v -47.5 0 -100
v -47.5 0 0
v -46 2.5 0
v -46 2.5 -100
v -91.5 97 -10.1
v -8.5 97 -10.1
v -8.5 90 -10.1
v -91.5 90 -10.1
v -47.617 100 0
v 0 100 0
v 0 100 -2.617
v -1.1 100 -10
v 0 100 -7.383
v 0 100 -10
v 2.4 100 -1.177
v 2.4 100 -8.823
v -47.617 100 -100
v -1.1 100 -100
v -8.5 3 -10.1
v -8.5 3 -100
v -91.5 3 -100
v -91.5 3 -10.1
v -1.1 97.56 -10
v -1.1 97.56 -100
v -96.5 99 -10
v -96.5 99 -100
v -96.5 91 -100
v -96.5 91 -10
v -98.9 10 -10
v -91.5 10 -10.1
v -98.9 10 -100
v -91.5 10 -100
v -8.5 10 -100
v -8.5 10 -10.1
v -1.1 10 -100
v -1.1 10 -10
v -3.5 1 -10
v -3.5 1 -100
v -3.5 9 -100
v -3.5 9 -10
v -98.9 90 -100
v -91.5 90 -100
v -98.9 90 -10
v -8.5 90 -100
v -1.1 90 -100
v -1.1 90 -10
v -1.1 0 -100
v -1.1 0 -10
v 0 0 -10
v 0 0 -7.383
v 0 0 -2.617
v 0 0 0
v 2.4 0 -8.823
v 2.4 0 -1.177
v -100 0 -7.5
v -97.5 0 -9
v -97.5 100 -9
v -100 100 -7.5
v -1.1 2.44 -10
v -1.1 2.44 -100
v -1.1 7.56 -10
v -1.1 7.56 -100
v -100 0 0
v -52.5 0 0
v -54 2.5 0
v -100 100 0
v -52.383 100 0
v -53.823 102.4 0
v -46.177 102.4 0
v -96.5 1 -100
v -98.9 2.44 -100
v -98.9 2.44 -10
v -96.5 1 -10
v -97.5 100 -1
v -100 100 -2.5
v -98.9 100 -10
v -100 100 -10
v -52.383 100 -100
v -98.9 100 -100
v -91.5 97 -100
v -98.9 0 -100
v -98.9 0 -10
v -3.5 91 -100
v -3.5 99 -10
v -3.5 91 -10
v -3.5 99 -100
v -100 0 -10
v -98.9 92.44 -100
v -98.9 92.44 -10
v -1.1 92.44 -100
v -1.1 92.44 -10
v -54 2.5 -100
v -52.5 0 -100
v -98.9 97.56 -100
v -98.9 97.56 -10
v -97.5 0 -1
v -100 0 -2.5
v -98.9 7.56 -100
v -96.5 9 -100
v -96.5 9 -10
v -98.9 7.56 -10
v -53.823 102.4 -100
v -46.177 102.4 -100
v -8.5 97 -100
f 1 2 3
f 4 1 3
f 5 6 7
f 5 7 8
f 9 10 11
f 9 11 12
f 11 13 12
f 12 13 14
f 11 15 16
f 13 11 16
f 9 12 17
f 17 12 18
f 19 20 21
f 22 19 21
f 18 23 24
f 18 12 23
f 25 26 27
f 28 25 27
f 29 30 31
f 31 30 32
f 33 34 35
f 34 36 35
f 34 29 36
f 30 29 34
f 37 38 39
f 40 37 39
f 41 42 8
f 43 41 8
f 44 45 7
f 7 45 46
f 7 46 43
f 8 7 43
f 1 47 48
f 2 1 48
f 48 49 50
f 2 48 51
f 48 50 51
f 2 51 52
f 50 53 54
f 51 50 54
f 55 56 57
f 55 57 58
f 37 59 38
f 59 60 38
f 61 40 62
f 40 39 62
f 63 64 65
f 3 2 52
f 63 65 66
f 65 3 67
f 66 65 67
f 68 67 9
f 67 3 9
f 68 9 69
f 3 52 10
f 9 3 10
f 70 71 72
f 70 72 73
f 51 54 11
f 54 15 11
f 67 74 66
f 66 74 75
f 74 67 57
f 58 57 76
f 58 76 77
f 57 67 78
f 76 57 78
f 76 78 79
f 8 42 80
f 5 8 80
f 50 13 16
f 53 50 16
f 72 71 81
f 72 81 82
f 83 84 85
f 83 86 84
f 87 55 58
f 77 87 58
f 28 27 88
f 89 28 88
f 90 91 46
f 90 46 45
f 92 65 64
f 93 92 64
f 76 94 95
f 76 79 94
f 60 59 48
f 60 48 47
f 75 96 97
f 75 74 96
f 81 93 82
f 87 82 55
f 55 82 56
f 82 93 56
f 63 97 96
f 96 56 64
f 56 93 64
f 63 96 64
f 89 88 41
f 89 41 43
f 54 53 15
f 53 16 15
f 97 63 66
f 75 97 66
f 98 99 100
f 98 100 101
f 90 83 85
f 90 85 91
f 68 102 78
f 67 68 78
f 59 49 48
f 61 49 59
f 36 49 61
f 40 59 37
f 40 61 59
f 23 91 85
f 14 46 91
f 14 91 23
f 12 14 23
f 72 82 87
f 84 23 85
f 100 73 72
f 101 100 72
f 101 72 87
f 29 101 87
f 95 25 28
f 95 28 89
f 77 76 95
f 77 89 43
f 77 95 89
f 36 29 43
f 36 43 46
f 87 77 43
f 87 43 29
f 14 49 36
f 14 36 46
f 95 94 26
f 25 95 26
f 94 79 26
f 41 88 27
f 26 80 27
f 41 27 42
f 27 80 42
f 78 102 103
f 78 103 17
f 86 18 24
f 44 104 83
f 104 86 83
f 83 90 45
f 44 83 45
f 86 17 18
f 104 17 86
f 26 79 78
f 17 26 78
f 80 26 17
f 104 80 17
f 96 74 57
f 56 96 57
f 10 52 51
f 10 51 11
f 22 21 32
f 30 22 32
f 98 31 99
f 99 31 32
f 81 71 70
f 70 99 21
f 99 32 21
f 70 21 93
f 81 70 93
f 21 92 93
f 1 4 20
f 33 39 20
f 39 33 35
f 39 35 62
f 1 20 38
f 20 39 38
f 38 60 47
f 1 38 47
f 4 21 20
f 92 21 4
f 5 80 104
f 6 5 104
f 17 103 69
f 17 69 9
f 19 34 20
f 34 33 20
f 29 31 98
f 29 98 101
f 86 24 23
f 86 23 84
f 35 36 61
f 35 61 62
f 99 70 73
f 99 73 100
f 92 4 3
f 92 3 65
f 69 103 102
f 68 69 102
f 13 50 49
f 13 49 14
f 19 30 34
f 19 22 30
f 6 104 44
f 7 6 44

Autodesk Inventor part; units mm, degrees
ref_plane "YZ Plane" through (0, 0, 0) normal (1, 0, 0) x (0, 1, 0)
ref_plane "XZ Plane" through (0, 0, 0) normal (0, 1, 0) x (-1, 0, 0)
sketch "Sketch1" plane through (0, 0, 0) normal (1, 0, 0) x (0, 1, 0)
  line L0 (0, 0) -> (100, 0)
  line L1 (100, 0) -> (100, -100)
  line L2 (100, -100) -> (90, -100)
  line L3 (90, -100) -> (90, -10)
  line L4 (90, -10) -> (10, -10)
  line L5 (10, -10) -> (10, -100)
  line L6 (10, -100) -> (0, -100)
  line L7 (0, -100) -> (0, 0)
  dimension "d0" = 100
  dimension "d1" = 100
  dimension "d2" = 10
  dimension "d3" = 10
  dimension "d4" = 10
extrude "Extrusion1" add sketch "Sketch1" against normal blind 100
sketch "Sketch2" plane through (0, 90, -100) normal (0, 0, -1) x (-1, 0, 0)
  line L0 (50, -90) -> (50, 10) construction
  line L1 (0, -40) -> (100, -40) construction
  line L2 (100, 0) -> (100, -80) projected
  line L3 (0, -90) -> (100, -90) projected
  line L4 (0, 10) -> (100, 10) projected
  line L5 (1, 10) -> (1, 7.5)
  line L6 (1, 7.5) -> (3.5, 9)
  line L7 (3.5, 9) -> (3.5, 1)
  line L8 (3.5, 1) -> (1, 2.5)
  line L9 (1, 2.5) -> (1, -40)
  line L10 (0, 0) -> (0, 10) projected
  line L11 (99, 10) -> (99, 7.5)
  line L12 (99, 7.5) -> (96.5, 9)
  line L13 (96.5, 9) -> (96.5, 1)
  line L14 (96.5, 1) -> (99, 2.5)
  line L15 (99, 2.5) -> (99, -40)
  line L16 (100, 0) -> (100, 10)
  line L17 (0, -90) -> (100, -90)
  line L18 (1, -90) -> (1, -87.5)
  line L19 (1, -87.5) -> (3.5, -89)
  line L20 (3.5, -89) -> (3.5, -81)
  line L21 (3.5, -81) -> (1, -82.5)
  line L22 (1, -82.5) -> (1, -40)
  line L23 (0, -80) -> (0, -90)
  line L24 (99, -82.5) -> (99, -40)
  line L25 (96.5, -81) -> (99, -82.5)
  line L26 (96.5, -89) -> (96.5, -81)
  line L27 (99, -87.5) -> (96.5, -89)
  line L28 (100, -80) -> (100, -90)
  line L29 (99, -90) -> (99, -87.5)
  line L30 (0, 10) -> (100, 10)
  line L31 (100, 10) -> (100, -90)
  line L32 (100, -90) -> (0, -90)
  line L33 (0, -90) -> (0, 10)
  point P0 (50, -40)
  dimension "d12" = 2.5
  dimension "d14" = 8
  dimension "d15" = 2.5
  dimension "d16" = 1
  dimension "d18" = 1
  dimension "d19" = 59.036
extrude "Extrusion2" cut sketch "Sketch2" against normal blind 90 contours L2 L28 L3 L29 L27 L26 L25 L24 L15 L14 L13 L12 L11 L4 L16 | L5 L6 L7 L8 L9 L22 L21 L20 L19 L18 L3 L23 L33 L10 L4
sketch "Sketch3" plane through (0, 100, 0) normal (0, 1, 0) x (1, 0, 0)
  line L0 (0, 0) -> (0, 10) projected
  line L1 (0, 0) -> (0, 2.5)
  line L2 (0, 2.5) -> (2.5, 1)
  line L3 (2.5, 1) -> (2.5, 9)
  line L4 (2.5, 9) -> (0, 7.5)
  line L5 (0, 10) -> (0, 0) projected
  line L6 (-1, 10) -> (0, 10) projected
  line L7 (0, 10) -> (0, 7.5)
  line L8 (0, 0) -> (-100, 0) projected
  line L9 (-97.5, 1) -> (-97.5, 9)
  line L10 (-97.5, 9) -> (-100, 7.5)
  line L11 (-100, 0) -> (-100, 10) projected
  line L12 (-100, 7.5) -> (-100, 2.5)
  line L13 (-97.5, 1) -> (-100, 2.5)
  dimension "d22" = 2.5
  dimension "d23" = 2.5
  dimension "d24" = 8
  dimension "d25" = 2.5
  dimension "d26" = 1
  dimension "d27" = 2.5
  dimension "d28" = 2.5
  dimension "d29" = 8
  dimension "d30" = 2.5
  dimension "d31" = 1
extrude "Extrusion3" add sketch "Sketch3" against normal up to surface (100 mm away) contours L0 L4 L3 L2
extrude "Extrusion4" cut sketch "Sketch3" against normal up to surface (100 mm away) contours L11 L10 L9 L13
sketch "Sketch4" plane through (-1, 90, -100) normal (0, 0, -1) x (-1, 0, 0)
  line L0 (0, -90) -> (98, -90) projected
  line L1 (46.5, -90) -> (45, -87.5)
  line L2 (45, -87.5) -> (53, -87.5)
  line L3 (53, -87.5) -> (51.5, -90)
  line L4 (0, 10) -> (98, 10) projected
  line L5 (49, 10) -> (49, -90) construction
  line L6 (46.5, -90) -> (51.5, -90)
  line L7 (45, 12.5) -> (53, 12.5)
  line L8 (53, 12.5) -> (51.5, 10)
  line L9 (42.8887, 10) -> (51.5, 10)
  line L10 (45, 12.5) -> (46.5, 10)
  line L11 (51.5, 10) -> (46.5, 10)
  point P0 (-1, -90)
  point P1 (49, -87.5)
  point P2 (49, -40)
  point P3 (49, -90)
  point P4 (49, 12.5)
  dimension "d36" = 8
  dimension "d37" = 2.5
  dimension "d38" = 5
  dimension "d39" = 2.5
  dimension "d40" = 8
  dimension "d42" = 5
extrude "Extrusion5" add sketch "Sketch4" against normal up to surface (100 mm away) contours L10 L7 L8 L4
extrude "Extrusion6" cut sketch "Sketch4" against normal up to surface (100 mm away) contours L1 L2 L3 L0
sketch "Sketch7" plane through (-1, 90, -100) normal (1, 0, 0) x (0, 0, -1)
  line L0 (0, 10) -> (0, 7.5) projected
  line L1 (-90, -87.5) -> (-90, -90) projected
  line L2 (0, 10) -> (-90, 10)
  line L3 (-90, 10) -> (-90, -90)
  line L4 (-90, -90) -> (0, -90)
  line L5 (0, -90) -> (0, 10)
  point P0 (-100, -90)
extrude "Extrusion9" cut sketch "Sketch7" against normal blind 0.1
sketch "Sketch8" plane through (-96.5, 91, -100) normal (0, 0, -1) x (-1, 0, 0)
  line L0 (-96.5, 9) -> (-49, 9) projected
  line L1 (-42.5, 11.5) -> (-50.5, 11.5) projected
  line L2 (-49, 9) -> (-50.5, 11.5)
  line L3 (-50.5, 11.5) -> (-42.5, 11.5)
  line L4 (-44, 9) -> (-42.5, 11.5) projected
  line L5 (-42.5, 11.5) -> (-44, 9)
  line L6 (-49, 9) -> (-44, 9)
  line L7 (-42.6766, 11.4) -> (-44.1166, 9)
  line L8 (-50.3234, 11.4) -> (-48.8834, 9)
  line L9 (-50.3234, 11.4) -> (-42.6766, 11.4)
  point P0 (-96.5, -91)
  dimension "d59" = 0.1
  dimension "d60" = 0.1
  dimension "d61" = 0.1
extrude "Extrusion10" cut sketch "Sketch8" against normal up to surface (100 mm away) contours L4 L6 L7 L9 L8 L2 L1
sketch "Sketch9" plane through (-99, 97.5, -100) normal (-1, 0, 0) x (0, 0, 1)
  line L0 (0, 2.5) -> (90, 2.5) projected
  line L1 (90, 2.5) -> (90, -97.5) projected
  line L2 (0, 2.5) -> (90, 2.5)
  line L3 (90, 2.5) -> (90, -97.5)
  line L4 (90, -97.5) -> (0, -97.5)
  line L5 (0, -97.5) -> (0, 2.5)
  point P0 (100, -97.5)
extrude "Extrusion11" cut sketch "Sketch9" against normal blind 0.1
sketch "Sketch10" plane through (2.5, 100, -1) normal (0, 1, 0) x (1, 0, 0)
  line L0 (0, 8) -> (-2.5, 6.5) projected
  line L1 (-2.5, 6.5) -> (0, 8)
  line L2 (-2.5, 1.5) -> (0, 0) projected
  line L3 (0, 8) -> (0, 0)
  line L4 (0, 0) -> (-2.5, 1.5)
  line L5 (-2.5, 6.3834) -> (-0.1, 7.8234)
  line L6 (-0.1, 7.8234) -> (-0.1, 0.1766)
  line L7 (-0.1, 0.1766) -> (-2.5, 1.6166)
  line L8 (0, 8) -> (-2.5, 6.5) projected
  line L9 (-2.5, 6.5) -> (-2.5, 9) projected
  line L10 (-2.5, 6.5) -> (-2.5, 1.5)
  point P0 (-2.5, -1)
  dimension "d66" = 0.1
  dimension "d67" = 0.1
  dimension "tol" = 0.1
extrude "Extrusion12" cut sketch "Sketch10" against normal through all contours L3 L2 L10 L7 L6 L5 L0
sketch "Sketch11" plane through (-3.5, 91, -100) normal (0, 0, -1) x (-1, 0, 0)
  line L0 (-2.4, -1) -> (95.4, -1) projected
  line L1 (5, -1) -> (88, -1)
  line L2 (88, -1) -> (88, 6)
  line L3 (88, 6) -> (5, 6)
  line L4 (5, 6) -> (5, -1)
  line L5 (0, 8) -> (0, 0) projected
  line L6 (93, 0) -> (93, 8) projected
  line L7 (48.8834, 9) -> (95.4, 9) projected
  point P0 (-3.5, -91)
  point P1 (88, -1)
  dimension "d71" = 5
  dimension "d72" = 5
  dimension "d73" = 3
ref_plane "Work Plane1" through (-3.4, 0, -10.1) normal (0, 0, 1) x (1, 0, 0)
extrude "Extrusion13" cut sketch "Sketch11" against normal up to surface (89.9 mm away)
ref_plane "Work Plane2" through (-1.1, 50, -10) normal (0, 1, 0) x (1, 0, 0)
mirror "Mirror1" about plane through (-1.1, 50, -10) normal (0, 1, 0) of "Extrusion13"
equation "\"d54\" = tol"
equation "\"d59\" = tol"
equation "\"d60\" = tol"
equation "\"d61\" = tol"
equation "\"d64\" = tol"
equation "\"d66\" = tol"
equation "\"d67\" = tol"
properties part number "mainframe"
